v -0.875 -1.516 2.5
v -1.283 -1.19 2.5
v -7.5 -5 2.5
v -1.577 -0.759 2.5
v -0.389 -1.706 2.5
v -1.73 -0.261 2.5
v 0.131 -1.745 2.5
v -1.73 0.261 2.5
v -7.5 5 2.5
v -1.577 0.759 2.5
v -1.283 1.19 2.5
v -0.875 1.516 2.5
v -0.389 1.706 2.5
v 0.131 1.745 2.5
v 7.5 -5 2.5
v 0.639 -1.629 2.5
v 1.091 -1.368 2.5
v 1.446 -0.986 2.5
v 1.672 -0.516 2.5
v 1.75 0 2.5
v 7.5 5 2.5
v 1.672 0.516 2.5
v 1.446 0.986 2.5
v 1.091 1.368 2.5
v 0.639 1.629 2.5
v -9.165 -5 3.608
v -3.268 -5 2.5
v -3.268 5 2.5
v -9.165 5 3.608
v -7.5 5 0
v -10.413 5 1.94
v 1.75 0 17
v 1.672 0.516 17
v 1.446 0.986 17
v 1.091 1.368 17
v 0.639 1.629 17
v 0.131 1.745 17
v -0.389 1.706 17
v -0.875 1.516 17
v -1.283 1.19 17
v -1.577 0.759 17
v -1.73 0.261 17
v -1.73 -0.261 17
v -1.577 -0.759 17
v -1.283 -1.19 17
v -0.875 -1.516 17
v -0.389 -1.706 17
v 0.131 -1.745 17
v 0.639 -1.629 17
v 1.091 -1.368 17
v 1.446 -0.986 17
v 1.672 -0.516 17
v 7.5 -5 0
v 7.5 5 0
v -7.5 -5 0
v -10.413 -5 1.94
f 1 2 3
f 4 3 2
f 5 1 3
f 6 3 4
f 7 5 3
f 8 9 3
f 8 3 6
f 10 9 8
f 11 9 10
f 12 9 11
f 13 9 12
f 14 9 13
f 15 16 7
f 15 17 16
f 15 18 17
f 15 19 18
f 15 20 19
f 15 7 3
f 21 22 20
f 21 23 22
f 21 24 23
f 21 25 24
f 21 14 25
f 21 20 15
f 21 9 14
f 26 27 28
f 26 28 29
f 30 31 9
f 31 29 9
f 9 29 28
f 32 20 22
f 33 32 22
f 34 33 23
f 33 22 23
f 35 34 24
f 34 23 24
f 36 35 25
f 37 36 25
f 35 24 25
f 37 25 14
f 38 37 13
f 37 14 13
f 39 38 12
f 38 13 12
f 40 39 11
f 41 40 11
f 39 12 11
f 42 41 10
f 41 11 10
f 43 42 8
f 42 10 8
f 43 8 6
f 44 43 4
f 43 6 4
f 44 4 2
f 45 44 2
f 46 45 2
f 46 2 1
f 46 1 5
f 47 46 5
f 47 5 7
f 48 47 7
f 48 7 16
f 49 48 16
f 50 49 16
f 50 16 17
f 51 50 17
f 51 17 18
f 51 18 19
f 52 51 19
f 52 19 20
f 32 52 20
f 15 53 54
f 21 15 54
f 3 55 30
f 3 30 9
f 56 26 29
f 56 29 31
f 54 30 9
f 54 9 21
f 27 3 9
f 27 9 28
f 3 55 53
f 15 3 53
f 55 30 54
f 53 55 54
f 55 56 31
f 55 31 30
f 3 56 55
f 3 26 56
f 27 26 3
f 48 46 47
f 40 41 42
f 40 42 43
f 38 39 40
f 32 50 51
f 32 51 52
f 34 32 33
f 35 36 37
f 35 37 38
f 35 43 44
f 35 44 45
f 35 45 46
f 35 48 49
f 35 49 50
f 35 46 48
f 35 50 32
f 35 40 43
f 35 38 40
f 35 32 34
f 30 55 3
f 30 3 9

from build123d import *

# Parameters (mm, degrees)
F0_R     = 1.75
F1_DEPTH = 17
F0_W     = 15
F0_H     = 10
F2_DEPTH = 2.5
F4_DEPTH = 10


with BuildPart() as f1:
    # F0 (on Top) → F1 (new body)
    with BuildSketch(Plane.XY):
        Circle(F0_R)
    extrude(amount=F1_DEPTH)

    # F0 (on Top) → F2 (join)
    with BuildSketch(Plane.XY):
        Rectangle(F0_W, F0_H)
        Circle(F0_R, mode=Mode.SUBTRACT)
    extrude(amount=F2_DEPTH)


with BuildPart() as f4:
    # F3 (on face) → F4 (new body)
    with BuildSketch(Plane.XZ.offset(5)):
        Polygon((-10.413474, 1.939502), (-7.5, 0), (-7.5, 2.5), (-9.164842, 3.608287), align=None)
        Polygon((-9.164842, 3.608287), (-7.5, 2.5), (-3.268089, 2.5), align=None)
    extrude(amount=-F4_DEPTH)


solid = Compound([f1.part, f4.part])
